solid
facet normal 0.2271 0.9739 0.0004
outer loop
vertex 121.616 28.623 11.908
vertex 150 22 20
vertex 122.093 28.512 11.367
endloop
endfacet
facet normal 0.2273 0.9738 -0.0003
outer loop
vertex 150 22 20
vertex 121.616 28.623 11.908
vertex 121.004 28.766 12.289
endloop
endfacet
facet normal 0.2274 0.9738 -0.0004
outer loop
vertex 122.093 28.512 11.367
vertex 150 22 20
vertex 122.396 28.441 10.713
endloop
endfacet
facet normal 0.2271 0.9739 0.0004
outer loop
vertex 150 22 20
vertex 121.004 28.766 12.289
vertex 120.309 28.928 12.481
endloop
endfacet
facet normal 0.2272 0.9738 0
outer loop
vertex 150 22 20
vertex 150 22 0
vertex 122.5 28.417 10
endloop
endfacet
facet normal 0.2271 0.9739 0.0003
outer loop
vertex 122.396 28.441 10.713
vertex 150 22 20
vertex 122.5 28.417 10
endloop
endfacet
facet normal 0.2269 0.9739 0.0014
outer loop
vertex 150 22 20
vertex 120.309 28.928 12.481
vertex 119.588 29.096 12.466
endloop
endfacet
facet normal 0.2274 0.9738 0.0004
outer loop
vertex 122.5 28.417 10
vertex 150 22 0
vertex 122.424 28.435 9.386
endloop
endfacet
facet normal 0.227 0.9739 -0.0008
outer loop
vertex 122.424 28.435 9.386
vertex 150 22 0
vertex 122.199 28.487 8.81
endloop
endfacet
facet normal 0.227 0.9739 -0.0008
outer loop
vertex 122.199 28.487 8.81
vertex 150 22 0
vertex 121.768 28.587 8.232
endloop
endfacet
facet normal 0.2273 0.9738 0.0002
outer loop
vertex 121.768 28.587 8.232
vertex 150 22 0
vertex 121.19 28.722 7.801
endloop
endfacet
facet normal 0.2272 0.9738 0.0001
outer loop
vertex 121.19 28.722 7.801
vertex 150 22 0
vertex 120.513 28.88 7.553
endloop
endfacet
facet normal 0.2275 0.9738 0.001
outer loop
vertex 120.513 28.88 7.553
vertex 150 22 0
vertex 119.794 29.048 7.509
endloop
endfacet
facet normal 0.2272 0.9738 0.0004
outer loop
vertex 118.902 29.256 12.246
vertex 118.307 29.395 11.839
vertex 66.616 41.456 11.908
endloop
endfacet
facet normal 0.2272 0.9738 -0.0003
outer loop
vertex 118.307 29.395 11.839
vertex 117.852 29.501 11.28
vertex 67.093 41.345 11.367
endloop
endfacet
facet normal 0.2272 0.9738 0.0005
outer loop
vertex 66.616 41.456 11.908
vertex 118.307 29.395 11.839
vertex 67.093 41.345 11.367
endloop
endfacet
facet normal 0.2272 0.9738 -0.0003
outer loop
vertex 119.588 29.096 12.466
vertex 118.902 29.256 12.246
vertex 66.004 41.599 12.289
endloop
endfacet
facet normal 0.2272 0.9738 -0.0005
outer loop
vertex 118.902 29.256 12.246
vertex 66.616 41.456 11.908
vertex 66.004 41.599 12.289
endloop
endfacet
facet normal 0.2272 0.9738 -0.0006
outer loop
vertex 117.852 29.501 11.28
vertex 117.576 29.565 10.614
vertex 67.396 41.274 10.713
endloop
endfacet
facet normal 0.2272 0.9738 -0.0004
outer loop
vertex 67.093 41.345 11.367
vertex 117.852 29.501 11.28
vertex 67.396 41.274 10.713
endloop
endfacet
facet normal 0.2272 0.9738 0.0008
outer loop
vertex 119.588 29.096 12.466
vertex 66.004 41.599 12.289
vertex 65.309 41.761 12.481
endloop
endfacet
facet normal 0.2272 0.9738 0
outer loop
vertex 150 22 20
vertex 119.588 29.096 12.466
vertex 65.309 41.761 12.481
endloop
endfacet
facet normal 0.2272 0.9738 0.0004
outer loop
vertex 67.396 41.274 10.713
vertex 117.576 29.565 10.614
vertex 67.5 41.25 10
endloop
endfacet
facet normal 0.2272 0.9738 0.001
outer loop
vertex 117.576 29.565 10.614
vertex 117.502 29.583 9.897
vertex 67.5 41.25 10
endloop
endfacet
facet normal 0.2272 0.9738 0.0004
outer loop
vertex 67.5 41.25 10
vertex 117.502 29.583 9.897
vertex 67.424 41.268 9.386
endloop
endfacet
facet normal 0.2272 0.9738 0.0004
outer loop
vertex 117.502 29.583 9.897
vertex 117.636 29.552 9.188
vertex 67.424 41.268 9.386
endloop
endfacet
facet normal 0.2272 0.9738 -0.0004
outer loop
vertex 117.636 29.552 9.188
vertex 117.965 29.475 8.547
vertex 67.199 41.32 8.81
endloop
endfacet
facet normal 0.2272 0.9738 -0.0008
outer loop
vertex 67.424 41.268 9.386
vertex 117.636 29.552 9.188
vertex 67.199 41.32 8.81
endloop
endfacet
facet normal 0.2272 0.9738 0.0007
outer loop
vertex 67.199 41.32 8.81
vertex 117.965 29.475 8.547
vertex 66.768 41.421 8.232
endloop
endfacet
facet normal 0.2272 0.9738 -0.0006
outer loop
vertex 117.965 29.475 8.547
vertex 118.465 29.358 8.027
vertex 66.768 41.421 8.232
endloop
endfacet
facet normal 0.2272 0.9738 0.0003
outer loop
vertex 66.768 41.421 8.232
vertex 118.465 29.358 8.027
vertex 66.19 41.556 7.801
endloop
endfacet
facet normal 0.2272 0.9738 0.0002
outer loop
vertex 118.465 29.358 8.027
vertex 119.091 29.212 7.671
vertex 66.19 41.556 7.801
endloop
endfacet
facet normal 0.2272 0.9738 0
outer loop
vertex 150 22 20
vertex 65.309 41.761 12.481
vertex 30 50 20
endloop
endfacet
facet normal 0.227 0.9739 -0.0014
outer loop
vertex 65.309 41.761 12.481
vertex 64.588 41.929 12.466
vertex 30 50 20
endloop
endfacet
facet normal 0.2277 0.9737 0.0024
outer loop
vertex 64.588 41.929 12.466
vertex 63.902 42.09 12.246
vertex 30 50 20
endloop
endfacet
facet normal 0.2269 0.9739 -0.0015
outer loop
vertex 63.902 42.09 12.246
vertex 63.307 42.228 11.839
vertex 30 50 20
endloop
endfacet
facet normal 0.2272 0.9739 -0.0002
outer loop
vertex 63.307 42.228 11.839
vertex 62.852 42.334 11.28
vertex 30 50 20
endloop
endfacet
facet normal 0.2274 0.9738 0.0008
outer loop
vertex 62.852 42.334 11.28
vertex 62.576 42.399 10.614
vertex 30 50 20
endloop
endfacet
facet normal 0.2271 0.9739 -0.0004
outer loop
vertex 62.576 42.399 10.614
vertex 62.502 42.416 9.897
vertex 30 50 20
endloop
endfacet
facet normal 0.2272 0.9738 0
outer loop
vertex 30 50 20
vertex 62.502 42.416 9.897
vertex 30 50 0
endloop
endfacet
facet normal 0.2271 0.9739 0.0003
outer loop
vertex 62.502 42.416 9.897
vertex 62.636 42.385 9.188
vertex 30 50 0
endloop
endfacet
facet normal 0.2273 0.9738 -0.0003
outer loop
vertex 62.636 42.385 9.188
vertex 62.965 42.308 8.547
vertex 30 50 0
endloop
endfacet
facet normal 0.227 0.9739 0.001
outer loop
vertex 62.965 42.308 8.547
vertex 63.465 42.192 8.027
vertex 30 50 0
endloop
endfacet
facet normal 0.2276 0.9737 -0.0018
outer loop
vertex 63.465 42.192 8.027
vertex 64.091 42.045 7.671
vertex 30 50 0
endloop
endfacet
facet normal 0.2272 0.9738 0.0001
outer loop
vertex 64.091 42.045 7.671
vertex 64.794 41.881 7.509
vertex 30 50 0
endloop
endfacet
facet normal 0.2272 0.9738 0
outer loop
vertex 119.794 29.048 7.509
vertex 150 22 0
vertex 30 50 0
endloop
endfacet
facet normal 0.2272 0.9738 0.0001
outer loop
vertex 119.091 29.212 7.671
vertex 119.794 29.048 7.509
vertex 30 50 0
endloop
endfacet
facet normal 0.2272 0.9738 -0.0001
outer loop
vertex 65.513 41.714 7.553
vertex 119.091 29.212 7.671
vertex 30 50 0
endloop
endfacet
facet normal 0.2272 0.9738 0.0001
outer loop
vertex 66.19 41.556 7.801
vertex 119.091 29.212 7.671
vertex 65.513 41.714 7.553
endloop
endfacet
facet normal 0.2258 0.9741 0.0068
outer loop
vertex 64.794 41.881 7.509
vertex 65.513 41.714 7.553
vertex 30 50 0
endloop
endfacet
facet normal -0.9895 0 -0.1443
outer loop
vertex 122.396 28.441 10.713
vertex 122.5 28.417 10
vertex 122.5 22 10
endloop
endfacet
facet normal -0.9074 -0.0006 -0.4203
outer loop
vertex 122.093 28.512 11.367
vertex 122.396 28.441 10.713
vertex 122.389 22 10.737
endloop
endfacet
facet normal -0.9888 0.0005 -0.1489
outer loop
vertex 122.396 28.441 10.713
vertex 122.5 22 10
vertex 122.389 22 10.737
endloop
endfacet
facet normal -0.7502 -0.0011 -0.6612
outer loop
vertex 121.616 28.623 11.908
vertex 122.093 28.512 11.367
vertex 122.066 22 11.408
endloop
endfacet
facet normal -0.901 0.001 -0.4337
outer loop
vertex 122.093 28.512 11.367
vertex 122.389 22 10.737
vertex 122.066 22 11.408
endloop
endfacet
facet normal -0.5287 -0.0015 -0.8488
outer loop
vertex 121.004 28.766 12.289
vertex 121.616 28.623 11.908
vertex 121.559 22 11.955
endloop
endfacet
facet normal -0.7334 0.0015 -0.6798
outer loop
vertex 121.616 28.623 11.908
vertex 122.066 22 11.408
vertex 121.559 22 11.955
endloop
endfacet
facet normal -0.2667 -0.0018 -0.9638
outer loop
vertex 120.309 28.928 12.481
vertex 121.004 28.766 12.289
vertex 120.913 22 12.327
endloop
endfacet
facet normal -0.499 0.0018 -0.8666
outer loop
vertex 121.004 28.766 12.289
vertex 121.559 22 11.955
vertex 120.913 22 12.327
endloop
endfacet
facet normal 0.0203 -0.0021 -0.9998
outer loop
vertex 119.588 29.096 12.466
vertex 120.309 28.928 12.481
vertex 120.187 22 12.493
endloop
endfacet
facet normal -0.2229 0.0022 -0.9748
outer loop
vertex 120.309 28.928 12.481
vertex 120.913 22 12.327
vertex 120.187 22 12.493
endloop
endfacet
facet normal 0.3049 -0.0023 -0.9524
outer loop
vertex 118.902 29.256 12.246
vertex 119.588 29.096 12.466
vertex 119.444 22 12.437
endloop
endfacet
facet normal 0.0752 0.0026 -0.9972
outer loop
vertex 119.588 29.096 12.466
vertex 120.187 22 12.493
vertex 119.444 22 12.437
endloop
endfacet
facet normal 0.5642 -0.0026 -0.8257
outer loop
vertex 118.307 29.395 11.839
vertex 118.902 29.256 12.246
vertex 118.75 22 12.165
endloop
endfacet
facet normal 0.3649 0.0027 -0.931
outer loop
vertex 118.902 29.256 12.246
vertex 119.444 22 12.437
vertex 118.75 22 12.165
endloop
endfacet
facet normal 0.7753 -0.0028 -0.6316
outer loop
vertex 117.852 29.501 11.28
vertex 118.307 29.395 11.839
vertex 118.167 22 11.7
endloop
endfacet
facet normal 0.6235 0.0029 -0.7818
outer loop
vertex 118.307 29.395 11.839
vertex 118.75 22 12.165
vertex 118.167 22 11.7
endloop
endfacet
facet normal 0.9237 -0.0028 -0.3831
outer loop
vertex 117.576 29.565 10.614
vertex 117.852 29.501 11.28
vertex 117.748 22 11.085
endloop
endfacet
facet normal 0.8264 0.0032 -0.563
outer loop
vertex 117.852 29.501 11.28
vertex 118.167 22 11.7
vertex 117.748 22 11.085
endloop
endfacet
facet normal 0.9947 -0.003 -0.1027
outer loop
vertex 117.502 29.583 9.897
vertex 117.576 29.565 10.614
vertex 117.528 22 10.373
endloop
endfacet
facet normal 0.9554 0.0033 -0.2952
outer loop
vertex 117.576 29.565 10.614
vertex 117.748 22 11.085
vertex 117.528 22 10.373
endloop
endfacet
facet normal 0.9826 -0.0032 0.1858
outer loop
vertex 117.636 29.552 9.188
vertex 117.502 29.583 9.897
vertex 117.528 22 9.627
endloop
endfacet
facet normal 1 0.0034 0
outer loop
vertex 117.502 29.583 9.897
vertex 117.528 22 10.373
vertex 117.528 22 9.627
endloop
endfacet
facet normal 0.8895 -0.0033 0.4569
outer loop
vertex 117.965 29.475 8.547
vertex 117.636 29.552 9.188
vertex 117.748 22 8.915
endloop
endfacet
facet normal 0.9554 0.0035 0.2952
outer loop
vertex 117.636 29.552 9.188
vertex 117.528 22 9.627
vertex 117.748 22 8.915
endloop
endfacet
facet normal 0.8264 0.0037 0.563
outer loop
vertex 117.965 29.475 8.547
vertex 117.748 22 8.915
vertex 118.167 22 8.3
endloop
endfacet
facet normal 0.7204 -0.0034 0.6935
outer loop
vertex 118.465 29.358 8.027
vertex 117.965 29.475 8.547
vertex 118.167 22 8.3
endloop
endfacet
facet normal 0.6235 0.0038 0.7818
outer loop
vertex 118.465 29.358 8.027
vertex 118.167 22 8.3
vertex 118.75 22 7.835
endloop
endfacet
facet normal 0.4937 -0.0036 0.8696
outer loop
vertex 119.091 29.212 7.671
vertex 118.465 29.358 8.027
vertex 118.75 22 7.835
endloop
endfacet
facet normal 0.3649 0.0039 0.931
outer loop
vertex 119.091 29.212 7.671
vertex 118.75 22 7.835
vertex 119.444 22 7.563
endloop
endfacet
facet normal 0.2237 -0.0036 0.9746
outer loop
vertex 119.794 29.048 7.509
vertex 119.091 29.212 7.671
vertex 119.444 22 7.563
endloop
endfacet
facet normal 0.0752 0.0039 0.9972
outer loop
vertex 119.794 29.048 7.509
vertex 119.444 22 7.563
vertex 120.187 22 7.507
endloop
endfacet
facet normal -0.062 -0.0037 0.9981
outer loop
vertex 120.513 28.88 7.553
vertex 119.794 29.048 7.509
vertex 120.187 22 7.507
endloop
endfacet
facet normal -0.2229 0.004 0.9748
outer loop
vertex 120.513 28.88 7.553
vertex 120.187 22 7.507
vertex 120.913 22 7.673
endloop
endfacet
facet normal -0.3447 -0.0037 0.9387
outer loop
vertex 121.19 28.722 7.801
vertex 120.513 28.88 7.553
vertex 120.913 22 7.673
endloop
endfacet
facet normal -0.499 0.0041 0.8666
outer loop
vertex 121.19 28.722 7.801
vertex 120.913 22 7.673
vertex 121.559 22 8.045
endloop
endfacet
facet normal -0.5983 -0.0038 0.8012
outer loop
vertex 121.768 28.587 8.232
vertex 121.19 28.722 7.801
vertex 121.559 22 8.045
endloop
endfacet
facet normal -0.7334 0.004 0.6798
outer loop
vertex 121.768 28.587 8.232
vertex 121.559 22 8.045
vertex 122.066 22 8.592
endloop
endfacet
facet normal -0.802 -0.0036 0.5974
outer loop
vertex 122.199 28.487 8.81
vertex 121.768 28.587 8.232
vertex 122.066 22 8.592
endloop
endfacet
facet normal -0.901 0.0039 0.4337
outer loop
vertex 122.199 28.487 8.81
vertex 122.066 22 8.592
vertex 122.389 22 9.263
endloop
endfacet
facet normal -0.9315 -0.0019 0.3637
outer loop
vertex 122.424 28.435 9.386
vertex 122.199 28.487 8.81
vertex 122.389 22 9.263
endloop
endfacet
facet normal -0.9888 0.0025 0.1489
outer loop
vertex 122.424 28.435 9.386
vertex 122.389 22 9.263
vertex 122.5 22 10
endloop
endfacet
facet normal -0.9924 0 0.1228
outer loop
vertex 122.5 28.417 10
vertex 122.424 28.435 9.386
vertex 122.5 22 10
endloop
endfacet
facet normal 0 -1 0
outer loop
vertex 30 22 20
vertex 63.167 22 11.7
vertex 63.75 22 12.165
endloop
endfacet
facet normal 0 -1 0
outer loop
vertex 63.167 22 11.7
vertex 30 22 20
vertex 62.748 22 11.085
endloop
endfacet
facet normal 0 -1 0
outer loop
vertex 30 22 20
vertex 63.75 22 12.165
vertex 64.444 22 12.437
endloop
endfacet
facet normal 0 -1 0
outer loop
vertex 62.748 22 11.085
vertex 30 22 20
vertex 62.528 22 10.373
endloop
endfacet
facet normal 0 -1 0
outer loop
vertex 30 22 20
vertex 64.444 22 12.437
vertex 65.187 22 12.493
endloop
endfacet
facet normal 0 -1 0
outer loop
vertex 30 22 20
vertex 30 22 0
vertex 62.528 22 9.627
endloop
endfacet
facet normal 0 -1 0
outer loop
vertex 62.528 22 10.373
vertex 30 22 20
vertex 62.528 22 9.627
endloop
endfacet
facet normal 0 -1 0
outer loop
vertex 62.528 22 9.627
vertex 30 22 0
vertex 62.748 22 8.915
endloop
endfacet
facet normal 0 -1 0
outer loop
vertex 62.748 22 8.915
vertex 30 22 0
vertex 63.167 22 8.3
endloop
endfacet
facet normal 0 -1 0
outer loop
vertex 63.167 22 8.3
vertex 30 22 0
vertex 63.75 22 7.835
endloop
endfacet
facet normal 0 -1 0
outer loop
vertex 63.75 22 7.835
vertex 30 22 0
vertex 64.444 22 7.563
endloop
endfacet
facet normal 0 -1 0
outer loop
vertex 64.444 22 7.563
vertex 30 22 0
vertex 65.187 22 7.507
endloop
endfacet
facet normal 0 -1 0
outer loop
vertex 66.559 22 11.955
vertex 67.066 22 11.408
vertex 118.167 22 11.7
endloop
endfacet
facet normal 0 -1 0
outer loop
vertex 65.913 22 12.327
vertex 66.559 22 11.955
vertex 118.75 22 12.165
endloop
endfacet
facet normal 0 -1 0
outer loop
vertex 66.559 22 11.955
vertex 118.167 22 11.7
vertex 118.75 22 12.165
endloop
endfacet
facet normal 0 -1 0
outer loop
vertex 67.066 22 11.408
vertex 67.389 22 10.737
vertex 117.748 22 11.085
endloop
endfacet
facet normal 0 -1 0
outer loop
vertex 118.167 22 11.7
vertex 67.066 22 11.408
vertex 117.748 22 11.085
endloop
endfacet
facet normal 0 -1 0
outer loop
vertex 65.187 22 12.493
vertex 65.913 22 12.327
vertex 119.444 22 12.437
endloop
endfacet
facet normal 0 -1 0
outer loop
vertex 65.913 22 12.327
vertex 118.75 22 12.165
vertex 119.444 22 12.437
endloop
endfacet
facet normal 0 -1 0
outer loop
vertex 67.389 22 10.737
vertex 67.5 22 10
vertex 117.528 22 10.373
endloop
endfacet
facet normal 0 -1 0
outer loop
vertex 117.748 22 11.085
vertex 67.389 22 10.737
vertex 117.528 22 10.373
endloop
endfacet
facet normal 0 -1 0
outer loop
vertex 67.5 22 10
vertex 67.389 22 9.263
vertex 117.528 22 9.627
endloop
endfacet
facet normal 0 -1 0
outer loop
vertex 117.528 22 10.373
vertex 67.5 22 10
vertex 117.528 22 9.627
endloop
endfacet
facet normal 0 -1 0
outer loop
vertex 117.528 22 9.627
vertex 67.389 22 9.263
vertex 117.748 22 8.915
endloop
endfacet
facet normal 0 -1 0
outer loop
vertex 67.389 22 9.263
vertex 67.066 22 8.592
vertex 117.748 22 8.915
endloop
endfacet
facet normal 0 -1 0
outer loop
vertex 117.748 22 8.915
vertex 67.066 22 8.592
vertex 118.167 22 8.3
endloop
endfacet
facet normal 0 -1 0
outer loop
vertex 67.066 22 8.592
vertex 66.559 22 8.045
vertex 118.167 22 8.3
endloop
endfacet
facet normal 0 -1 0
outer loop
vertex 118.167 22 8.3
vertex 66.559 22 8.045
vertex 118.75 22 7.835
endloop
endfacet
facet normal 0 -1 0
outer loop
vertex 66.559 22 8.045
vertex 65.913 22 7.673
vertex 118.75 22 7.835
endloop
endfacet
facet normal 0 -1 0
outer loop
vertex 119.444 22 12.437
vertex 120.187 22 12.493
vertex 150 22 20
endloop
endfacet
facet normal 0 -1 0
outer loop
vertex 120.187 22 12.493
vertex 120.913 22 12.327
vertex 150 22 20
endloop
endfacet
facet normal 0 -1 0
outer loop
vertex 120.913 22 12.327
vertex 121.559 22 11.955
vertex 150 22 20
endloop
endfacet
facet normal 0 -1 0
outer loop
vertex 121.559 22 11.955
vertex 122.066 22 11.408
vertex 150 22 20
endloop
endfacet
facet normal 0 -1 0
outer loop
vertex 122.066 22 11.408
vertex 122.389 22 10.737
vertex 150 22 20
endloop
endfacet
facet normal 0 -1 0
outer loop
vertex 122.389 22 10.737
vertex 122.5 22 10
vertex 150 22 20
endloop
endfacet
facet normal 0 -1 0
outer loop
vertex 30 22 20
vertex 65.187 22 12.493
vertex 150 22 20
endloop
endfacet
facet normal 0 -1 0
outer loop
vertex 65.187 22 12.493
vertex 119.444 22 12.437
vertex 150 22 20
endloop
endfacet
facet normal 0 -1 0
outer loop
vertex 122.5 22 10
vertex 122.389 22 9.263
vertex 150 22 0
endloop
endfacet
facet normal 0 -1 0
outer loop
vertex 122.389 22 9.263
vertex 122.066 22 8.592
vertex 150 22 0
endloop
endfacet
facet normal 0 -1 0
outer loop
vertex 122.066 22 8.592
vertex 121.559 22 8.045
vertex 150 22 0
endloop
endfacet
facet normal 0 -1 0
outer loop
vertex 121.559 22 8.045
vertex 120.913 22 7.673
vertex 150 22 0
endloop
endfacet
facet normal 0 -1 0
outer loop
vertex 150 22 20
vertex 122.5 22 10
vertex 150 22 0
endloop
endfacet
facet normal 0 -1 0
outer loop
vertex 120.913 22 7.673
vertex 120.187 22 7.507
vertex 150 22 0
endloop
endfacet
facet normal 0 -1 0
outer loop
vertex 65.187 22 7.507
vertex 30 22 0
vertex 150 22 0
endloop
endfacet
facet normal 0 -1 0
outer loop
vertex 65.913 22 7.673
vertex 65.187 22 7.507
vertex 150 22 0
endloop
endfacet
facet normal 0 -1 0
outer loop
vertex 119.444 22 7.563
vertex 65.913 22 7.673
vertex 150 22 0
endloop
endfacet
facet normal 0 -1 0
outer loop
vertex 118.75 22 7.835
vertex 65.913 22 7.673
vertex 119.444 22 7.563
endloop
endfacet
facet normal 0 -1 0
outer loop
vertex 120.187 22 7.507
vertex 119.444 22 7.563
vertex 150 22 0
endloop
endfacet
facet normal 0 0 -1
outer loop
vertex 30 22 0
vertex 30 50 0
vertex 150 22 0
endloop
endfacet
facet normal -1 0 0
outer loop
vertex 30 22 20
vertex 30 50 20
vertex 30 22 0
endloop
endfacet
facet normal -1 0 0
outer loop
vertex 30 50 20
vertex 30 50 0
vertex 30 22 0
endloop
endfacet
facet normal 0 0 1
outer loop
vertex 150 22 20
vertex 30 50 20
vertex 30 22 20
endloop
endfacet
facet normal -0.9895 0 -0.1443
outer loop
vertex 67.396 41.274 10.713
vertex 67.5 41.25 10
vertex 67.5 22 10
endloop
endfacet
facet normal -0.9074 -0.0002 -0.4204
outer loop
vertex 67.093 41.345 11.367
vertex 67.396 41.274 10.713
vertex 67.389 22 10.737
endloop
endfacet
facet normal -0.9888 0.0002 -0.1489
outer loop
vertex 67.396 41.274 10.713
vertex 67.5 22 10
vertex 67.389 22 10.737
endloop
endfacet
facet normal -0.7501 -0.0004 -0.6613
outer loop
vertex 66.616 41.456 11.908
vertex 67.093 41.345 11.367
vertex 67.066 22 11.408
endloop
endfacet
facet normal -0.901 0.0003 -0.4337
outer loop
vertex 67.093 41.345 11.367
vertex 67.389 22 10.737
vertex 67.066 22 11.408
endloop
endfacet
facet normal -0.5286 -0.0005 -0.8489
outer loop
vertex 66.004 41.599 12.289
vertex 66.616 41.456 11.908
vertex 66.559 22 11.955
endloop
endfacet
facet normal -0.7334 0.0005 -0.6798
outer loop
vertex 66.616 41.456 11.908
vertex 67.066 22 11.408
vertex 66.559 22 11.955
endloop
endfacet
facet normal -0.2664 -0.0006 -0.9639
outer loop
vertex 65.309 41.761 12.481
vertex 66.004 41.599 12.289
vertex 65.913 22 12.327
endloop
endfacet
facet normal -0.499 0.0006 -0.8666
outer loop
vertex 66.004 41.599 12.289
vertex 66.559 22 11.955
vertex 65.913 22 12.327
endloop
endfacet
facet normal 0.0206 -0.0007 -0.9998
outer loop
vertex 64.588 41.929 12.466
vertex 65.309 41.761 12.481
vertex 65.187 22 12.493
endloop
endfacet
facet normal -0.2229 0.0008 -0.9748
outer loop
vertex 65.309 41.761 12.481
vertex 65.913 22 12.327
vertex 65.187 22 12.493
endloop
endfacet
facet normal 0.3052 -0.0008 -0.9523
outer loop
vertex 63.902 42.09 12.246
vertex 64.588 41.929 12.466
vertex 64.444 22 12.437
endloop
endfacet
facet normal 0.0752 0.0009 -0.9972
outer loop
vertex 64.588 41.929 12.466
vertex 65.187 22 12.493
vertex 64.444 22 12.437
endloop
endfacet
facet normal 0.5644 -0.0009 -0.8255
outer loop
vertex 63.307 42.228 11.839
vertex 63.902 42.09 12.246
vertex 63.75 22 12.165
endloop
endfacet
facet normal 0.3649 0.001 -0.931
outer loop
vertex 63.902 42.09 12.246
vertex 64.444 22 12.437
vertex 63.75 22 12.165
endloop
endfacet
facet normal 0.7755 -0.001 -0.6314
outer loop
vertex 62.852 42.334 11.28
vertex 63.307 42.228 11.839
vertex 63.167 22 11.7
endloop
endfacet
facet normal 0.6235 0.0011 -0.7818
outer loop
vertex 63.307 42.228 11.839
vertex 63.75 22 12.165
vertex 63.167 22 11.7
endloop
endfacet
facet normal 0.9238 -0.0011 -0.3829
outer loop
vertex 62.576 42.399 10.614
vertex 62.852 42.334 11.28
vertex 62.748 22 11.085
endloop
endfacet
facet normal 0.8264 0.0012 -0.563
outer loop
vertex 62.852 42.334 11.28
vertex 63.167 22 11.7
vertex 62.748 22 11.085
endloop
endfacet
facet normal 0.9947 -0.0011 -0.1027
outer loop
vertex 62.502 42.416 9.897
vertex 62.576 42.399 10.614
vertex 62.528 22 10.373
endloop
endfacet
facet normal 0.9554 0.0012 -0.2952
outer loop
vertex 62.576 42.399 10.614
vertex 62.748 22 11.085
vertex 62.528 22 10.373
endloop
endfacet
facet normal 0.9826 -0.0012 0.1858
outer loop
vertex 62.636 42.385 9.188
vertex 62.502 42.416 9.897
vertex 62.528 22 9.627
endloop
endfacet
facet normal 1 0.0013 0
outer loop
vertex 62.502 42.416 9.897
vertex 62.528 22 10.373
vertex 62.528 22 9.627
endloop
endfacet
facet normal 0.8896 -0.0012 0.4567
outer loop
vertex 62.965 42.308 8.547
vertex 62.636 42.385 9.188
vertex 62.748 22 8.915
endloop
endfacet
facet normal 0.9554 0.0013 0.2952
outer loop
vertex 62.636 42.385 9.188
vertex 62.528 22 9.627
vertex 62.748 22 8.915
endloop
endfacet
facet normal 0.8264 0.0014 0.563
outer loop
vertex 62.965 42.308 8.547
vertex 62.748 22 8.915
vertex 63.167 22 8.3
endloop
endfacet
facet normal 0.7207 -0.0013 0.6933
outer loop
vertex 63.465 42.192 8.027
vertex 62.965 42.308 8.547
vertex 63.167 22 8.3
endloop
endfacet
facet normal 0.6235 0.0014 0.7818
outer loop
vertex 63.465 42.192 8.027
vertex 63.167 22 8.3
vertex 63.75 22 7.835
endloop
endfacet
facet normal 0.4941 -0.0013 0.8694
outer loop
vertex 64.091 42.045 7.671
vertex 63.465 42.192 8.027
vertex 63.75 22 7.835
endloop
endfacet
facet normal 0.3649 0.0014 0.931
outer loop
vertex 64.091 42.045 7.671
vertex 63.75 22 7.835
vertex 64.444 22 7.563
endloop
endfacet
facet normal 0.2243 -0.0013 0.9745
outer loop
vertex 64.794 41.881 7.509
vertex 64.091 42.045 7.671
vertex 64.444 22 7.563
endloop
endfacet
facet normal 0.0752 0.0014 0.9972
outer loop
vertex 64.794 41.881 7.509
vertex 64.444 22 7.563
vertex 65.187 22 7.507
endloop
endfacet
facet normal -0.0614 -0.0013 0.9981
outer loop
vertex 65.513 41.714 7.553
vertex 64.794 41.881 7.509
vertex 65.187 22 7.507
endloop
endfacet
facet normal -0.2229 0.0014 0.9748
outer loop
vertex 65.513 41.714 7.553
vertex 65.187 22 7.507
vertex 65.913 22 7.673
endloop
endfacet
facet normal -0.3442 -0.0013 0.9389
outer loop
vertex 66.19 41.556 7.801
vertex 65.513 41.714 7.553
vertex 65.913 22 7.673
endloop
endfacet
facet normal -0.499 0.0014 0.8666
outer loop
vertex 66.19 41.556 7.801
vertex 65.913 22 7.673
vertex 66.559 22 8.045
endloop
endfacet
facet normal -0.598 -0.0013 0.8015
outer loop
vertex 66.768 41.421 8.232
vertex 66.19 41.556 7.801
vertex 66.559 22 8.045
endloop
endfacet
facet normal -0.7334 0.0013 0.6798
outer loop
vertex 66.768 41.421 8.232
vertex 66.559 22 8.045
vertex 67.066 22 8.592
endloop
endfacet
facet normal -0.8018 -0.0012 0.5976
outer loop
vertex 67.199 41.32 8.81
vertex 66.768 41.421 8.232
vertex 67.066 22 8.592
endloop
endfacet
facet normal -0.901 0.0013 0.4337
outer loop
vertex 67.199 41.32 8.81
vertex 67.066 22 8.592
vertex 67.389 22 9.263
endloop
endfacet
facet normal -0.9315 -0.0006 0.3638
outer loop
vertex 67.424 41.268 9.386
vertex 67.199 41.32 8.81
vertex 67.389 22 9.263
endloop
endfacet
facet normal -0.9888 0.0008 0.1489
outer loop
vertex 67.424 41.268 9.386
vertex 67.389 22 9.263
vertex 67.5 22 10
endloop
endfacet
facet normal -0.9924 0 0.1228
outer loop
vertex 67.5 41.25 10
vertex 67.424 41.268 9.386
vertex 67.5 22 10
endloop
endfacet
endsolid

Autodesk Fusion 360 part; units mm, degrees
sketch "Sketch1" plane through (0, 0, 0) normal (0, 0, 1) x (1, 0, 0)
  line L0 (30, 50) -> (30, 22)
  line L1 (30, 22) -> (150, 22)
  line L2 (150, 22) -> (30, 50)
  dimension "d1" = 28
  dimension "d2" = 120
extrude "Extrude1" add sketch "Sketch1" along normal blind 20
sketch "Sketch2" plane through (0, 22, 0) normal (0, -1, 0) x (1, 0, 0)
  line L0 (30, 0) -> (150, 0)
  line L1 (150, 0) -> (150, 20)
  line L2 (150, 20) -> (30, 20)
  line L3 (30, 20) -> (30, 0)
  line L4 (30, 10) -> (150, 10)
  line L5 (150, 10) -> (120, 10)
  circle A0 centre (120, 10) radius 2.5
  circle A1 centre (65, 10) radius 2.5
  dimension "d5" = 30
  dimension "d6" = 5
  dimension "d7" = 5
extrude "Extrude2" cut sketch "Sketch2" against normal blind 50 contours L4 A1 | L4 A1 | L4 L5 A0 | L4 L5 A0
sketch "Sketch3" plane through (0, 0, 20) normal (0, 0, 1) x (-1, 0, 0)
  line L0 (-150, -22) -> (-30, -50)
  line L1 (-30, -50) -> (-30, -22)
  line L2 (-30, -22) -> (-150, -22)
  line L3 (-30, -50) -> (-150, -50)
  line L4 (-150, -50) -> (-150, -22)
sketch "Sketch4" plane through (0, 22, 0) normal (0, -1, 0) x (1, 0, 0)
  circle A0 centre (65, 10) radius 2.5
  circle A1 centre (120, 10) radius 2.5
  line L0 (30, 0) -> (150, 0)
  line L1 (150, 0) -> (150, 20)
  line L2 (150, 20) -> (30, 20)
  line L3 (30, 20) -> (30, 0)
  line L4 (65, 10) -> (65, 20)
  line L5 (120, 10) -> (120, 20)
sketch "Sketch5" plane through (0, 0, 20) normal (0, 0, 1) x (-1, 0, 0)
  line L0 (-120, -22) -> (-120, -50)
  line L1 (-120, -50) -> (-65, -22)
  line L2 (-65, -22) -> (-65, -50)
sketch "Sketch6" plane through (90, 22, 10) normal (0, -1, 0) x (1, 0, 0)
  line L0 (30, 14.4) -> (40.6132, 4.6089)
sketch "Sketch7" plane through (0, 0, 0) normal (0, 0, -1) x (1, 0, 0)
  line L0 (30, -50) -> (150, -22)
  line L1 (150, -22) -> (30, -22)
  line L2 (30, -22) -> (30, -50)
